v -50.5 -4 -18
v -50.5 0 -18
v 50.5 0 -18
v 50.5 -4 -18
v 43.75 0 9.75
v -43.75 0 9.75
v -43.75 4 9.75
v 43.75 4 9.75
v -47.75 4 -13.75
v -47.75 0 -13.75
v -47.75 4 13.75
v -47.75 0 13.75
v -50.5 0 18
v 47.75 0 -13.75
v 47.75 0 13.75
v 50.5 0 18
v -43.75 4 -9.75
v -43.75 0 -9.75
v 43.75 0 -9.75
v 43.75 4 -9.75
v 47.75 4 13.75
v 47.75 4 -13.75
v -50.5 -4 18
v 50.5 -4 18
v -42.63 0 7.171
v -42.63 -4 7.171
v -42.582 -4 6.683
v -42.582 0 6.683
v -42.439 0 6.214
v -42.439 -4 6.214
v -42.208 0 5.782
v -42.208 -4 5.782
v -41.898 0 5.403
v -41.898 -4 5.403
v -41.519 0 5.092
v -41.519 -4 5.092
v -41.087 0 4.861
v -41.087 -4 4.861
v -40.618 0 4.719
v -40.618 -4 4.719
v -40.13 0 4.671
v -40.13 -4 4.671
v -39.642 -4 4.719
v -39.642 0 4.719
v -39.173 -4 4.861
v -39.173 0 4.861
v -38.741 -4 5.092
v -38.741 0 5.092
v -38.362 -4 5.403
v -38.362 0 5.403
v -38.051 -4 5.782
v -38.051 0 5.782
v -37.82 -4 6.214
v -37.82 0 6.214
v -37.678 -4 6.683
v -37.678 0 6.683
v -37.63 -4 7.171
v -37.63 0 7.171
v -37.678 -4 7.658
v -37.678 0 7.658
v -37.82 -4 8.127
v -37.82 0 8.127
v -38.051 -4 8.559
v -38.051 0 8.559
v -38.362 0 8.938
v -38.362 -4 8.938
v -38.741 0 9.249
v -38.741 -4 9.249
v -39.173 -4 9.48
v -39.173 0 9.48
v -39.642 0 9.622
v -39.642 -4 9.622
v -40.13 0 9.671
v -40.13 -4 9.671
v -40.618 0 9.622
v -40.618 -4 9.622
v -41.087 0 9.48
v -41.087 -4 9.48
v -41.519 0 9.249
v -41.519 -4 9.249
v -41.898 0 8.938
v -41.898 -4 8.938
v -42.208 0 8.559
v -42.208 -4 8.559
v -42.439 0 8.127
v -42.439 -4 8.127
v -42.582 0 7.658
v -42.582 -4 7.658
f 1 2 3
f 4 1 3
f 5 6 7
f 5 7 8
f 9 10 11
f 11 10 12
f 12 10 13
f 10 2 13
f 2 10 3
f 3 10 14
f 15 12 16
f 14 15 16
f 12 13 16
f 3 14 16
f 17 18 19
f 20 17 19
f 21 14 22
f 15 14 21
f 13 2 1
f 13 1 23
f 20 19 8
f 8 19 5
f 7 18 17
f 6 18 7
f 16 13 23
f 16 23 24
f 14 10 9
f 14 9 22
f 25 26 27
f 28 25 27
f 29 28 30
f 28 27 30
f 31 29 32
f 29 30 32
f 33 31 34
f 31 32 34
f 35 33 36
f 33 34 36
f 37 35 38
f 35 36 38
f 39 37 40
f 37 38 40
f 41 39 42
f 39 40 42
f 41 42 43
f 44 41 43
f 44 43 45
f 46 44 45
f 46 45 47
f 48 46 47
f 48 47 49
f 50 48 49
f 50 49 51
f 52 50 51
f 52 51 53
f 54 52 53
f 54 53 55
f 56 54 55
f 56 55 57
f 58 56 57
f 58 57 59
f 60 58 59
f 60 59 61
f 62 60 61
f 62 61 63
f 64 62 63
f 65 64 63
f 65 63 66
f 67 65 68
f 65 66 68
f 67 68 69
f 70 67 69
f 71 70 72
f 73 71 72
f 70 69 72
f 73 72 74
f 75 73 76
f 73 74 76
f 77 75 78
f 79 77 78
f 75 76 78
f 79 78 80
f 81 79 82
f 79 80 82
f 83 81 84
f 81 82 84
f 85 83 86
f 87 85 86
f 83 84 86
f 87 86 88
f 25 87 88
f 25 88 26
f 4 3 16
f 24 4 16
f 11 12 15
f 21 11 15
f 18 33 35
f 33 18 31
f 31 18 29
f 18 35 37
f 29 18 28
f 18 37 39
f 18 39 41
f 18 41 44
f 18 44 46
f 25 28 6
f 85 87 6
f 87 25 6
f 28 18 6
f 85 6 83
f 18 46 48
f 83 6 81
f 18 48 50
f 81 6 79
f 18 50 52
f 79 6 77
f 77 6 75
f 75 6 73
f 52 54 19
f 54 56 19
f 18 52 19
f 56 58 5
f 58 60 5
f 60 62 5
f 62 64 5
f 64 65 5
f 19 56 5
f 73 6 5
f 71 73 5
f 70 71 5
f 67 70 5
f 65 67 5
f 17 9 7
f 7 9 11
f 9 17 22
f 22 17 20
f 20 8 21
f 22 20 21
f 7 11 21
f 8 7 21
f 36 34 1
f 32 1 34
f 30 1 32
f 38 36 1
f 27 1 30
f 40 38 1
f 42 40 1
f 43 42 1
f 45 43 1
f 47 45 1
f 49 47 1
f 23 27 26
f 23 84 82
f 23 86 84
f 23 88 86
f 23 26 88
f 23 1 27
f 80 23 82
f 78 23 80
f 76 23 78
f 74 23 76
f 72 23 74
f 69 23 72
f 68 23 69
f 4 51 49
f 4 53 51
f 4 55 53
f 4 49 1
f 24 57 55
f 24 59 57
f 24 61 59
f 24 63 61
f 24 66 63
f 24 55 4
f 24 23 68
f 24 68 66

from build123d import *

# Parameters (mm, degrees)
F0_W      = 101
F0_H      = 36
F0_W_2    = 95.5
F0_H_2    = 27.5
F0_W_3    = 87.5
F0_H_3    = 19.5
F1_DEPTH  = 4
F1_FACE_W = 101
F1_FACE_H = 36
F2_W      = 95.5
F2_H      = 27.5
F2_W_2    = 87.5
F2_H_2    = 19.5
F3_DEPTH  = 4
F5_D      = 5
F5_DEPTH  = 6
F5_TIP    = 1.5021515476


with BuildPart() as f1:
    # F0 (on Front) → F1 (new body)
    with BuildSketch(Plane.XZ):
        Rectangle(F0_W, F0_H)
        Rectangle(F0_W_2, F0_H_2, mode=Mode.SUBTRACT)
        Rectangle(F0_W_2, F0_H_2)
        Rectangle(F0_W_3, F0_H_3, mode=Mode.SUBTRACT)
        Rectangle(F0_W_3, F0_H_3)
    extrude(amount=F1_DEPTH)

    # F1_face (on face) + F2 (on Front) → F3 (join)
    with BuildSketch(Plane.XZ.offset(4)):
        Rectangle(F1_FACE_W, F1_FACE_H)
    with BuildSketch(Plane.XZ):
        Rectangle(F2_W, F2_H)
        Rectangle(F2_W_2, F2_H_2, mode=Mode.SUBTRACT)
    extrude(amount=-F3_DEPTH)

    # F5
    with Locations(Plane(origin=(0, 0, 0), x_dir=(1, 0, 0), z_dir=(0, 1, 0))):
        with Locations((-40.1297956705, -7.1705272421)):
            Hole(F5_D / 2, depth=F5_DEPTH)
            with Locations((0, 0, -(F5_DEPTH + F5_TIP / 2))):  # 118° drill point
                Cone(0, F5_D / 2, F5_TIP, mode=Mode.SUBTRACT)


solid = f1.part
